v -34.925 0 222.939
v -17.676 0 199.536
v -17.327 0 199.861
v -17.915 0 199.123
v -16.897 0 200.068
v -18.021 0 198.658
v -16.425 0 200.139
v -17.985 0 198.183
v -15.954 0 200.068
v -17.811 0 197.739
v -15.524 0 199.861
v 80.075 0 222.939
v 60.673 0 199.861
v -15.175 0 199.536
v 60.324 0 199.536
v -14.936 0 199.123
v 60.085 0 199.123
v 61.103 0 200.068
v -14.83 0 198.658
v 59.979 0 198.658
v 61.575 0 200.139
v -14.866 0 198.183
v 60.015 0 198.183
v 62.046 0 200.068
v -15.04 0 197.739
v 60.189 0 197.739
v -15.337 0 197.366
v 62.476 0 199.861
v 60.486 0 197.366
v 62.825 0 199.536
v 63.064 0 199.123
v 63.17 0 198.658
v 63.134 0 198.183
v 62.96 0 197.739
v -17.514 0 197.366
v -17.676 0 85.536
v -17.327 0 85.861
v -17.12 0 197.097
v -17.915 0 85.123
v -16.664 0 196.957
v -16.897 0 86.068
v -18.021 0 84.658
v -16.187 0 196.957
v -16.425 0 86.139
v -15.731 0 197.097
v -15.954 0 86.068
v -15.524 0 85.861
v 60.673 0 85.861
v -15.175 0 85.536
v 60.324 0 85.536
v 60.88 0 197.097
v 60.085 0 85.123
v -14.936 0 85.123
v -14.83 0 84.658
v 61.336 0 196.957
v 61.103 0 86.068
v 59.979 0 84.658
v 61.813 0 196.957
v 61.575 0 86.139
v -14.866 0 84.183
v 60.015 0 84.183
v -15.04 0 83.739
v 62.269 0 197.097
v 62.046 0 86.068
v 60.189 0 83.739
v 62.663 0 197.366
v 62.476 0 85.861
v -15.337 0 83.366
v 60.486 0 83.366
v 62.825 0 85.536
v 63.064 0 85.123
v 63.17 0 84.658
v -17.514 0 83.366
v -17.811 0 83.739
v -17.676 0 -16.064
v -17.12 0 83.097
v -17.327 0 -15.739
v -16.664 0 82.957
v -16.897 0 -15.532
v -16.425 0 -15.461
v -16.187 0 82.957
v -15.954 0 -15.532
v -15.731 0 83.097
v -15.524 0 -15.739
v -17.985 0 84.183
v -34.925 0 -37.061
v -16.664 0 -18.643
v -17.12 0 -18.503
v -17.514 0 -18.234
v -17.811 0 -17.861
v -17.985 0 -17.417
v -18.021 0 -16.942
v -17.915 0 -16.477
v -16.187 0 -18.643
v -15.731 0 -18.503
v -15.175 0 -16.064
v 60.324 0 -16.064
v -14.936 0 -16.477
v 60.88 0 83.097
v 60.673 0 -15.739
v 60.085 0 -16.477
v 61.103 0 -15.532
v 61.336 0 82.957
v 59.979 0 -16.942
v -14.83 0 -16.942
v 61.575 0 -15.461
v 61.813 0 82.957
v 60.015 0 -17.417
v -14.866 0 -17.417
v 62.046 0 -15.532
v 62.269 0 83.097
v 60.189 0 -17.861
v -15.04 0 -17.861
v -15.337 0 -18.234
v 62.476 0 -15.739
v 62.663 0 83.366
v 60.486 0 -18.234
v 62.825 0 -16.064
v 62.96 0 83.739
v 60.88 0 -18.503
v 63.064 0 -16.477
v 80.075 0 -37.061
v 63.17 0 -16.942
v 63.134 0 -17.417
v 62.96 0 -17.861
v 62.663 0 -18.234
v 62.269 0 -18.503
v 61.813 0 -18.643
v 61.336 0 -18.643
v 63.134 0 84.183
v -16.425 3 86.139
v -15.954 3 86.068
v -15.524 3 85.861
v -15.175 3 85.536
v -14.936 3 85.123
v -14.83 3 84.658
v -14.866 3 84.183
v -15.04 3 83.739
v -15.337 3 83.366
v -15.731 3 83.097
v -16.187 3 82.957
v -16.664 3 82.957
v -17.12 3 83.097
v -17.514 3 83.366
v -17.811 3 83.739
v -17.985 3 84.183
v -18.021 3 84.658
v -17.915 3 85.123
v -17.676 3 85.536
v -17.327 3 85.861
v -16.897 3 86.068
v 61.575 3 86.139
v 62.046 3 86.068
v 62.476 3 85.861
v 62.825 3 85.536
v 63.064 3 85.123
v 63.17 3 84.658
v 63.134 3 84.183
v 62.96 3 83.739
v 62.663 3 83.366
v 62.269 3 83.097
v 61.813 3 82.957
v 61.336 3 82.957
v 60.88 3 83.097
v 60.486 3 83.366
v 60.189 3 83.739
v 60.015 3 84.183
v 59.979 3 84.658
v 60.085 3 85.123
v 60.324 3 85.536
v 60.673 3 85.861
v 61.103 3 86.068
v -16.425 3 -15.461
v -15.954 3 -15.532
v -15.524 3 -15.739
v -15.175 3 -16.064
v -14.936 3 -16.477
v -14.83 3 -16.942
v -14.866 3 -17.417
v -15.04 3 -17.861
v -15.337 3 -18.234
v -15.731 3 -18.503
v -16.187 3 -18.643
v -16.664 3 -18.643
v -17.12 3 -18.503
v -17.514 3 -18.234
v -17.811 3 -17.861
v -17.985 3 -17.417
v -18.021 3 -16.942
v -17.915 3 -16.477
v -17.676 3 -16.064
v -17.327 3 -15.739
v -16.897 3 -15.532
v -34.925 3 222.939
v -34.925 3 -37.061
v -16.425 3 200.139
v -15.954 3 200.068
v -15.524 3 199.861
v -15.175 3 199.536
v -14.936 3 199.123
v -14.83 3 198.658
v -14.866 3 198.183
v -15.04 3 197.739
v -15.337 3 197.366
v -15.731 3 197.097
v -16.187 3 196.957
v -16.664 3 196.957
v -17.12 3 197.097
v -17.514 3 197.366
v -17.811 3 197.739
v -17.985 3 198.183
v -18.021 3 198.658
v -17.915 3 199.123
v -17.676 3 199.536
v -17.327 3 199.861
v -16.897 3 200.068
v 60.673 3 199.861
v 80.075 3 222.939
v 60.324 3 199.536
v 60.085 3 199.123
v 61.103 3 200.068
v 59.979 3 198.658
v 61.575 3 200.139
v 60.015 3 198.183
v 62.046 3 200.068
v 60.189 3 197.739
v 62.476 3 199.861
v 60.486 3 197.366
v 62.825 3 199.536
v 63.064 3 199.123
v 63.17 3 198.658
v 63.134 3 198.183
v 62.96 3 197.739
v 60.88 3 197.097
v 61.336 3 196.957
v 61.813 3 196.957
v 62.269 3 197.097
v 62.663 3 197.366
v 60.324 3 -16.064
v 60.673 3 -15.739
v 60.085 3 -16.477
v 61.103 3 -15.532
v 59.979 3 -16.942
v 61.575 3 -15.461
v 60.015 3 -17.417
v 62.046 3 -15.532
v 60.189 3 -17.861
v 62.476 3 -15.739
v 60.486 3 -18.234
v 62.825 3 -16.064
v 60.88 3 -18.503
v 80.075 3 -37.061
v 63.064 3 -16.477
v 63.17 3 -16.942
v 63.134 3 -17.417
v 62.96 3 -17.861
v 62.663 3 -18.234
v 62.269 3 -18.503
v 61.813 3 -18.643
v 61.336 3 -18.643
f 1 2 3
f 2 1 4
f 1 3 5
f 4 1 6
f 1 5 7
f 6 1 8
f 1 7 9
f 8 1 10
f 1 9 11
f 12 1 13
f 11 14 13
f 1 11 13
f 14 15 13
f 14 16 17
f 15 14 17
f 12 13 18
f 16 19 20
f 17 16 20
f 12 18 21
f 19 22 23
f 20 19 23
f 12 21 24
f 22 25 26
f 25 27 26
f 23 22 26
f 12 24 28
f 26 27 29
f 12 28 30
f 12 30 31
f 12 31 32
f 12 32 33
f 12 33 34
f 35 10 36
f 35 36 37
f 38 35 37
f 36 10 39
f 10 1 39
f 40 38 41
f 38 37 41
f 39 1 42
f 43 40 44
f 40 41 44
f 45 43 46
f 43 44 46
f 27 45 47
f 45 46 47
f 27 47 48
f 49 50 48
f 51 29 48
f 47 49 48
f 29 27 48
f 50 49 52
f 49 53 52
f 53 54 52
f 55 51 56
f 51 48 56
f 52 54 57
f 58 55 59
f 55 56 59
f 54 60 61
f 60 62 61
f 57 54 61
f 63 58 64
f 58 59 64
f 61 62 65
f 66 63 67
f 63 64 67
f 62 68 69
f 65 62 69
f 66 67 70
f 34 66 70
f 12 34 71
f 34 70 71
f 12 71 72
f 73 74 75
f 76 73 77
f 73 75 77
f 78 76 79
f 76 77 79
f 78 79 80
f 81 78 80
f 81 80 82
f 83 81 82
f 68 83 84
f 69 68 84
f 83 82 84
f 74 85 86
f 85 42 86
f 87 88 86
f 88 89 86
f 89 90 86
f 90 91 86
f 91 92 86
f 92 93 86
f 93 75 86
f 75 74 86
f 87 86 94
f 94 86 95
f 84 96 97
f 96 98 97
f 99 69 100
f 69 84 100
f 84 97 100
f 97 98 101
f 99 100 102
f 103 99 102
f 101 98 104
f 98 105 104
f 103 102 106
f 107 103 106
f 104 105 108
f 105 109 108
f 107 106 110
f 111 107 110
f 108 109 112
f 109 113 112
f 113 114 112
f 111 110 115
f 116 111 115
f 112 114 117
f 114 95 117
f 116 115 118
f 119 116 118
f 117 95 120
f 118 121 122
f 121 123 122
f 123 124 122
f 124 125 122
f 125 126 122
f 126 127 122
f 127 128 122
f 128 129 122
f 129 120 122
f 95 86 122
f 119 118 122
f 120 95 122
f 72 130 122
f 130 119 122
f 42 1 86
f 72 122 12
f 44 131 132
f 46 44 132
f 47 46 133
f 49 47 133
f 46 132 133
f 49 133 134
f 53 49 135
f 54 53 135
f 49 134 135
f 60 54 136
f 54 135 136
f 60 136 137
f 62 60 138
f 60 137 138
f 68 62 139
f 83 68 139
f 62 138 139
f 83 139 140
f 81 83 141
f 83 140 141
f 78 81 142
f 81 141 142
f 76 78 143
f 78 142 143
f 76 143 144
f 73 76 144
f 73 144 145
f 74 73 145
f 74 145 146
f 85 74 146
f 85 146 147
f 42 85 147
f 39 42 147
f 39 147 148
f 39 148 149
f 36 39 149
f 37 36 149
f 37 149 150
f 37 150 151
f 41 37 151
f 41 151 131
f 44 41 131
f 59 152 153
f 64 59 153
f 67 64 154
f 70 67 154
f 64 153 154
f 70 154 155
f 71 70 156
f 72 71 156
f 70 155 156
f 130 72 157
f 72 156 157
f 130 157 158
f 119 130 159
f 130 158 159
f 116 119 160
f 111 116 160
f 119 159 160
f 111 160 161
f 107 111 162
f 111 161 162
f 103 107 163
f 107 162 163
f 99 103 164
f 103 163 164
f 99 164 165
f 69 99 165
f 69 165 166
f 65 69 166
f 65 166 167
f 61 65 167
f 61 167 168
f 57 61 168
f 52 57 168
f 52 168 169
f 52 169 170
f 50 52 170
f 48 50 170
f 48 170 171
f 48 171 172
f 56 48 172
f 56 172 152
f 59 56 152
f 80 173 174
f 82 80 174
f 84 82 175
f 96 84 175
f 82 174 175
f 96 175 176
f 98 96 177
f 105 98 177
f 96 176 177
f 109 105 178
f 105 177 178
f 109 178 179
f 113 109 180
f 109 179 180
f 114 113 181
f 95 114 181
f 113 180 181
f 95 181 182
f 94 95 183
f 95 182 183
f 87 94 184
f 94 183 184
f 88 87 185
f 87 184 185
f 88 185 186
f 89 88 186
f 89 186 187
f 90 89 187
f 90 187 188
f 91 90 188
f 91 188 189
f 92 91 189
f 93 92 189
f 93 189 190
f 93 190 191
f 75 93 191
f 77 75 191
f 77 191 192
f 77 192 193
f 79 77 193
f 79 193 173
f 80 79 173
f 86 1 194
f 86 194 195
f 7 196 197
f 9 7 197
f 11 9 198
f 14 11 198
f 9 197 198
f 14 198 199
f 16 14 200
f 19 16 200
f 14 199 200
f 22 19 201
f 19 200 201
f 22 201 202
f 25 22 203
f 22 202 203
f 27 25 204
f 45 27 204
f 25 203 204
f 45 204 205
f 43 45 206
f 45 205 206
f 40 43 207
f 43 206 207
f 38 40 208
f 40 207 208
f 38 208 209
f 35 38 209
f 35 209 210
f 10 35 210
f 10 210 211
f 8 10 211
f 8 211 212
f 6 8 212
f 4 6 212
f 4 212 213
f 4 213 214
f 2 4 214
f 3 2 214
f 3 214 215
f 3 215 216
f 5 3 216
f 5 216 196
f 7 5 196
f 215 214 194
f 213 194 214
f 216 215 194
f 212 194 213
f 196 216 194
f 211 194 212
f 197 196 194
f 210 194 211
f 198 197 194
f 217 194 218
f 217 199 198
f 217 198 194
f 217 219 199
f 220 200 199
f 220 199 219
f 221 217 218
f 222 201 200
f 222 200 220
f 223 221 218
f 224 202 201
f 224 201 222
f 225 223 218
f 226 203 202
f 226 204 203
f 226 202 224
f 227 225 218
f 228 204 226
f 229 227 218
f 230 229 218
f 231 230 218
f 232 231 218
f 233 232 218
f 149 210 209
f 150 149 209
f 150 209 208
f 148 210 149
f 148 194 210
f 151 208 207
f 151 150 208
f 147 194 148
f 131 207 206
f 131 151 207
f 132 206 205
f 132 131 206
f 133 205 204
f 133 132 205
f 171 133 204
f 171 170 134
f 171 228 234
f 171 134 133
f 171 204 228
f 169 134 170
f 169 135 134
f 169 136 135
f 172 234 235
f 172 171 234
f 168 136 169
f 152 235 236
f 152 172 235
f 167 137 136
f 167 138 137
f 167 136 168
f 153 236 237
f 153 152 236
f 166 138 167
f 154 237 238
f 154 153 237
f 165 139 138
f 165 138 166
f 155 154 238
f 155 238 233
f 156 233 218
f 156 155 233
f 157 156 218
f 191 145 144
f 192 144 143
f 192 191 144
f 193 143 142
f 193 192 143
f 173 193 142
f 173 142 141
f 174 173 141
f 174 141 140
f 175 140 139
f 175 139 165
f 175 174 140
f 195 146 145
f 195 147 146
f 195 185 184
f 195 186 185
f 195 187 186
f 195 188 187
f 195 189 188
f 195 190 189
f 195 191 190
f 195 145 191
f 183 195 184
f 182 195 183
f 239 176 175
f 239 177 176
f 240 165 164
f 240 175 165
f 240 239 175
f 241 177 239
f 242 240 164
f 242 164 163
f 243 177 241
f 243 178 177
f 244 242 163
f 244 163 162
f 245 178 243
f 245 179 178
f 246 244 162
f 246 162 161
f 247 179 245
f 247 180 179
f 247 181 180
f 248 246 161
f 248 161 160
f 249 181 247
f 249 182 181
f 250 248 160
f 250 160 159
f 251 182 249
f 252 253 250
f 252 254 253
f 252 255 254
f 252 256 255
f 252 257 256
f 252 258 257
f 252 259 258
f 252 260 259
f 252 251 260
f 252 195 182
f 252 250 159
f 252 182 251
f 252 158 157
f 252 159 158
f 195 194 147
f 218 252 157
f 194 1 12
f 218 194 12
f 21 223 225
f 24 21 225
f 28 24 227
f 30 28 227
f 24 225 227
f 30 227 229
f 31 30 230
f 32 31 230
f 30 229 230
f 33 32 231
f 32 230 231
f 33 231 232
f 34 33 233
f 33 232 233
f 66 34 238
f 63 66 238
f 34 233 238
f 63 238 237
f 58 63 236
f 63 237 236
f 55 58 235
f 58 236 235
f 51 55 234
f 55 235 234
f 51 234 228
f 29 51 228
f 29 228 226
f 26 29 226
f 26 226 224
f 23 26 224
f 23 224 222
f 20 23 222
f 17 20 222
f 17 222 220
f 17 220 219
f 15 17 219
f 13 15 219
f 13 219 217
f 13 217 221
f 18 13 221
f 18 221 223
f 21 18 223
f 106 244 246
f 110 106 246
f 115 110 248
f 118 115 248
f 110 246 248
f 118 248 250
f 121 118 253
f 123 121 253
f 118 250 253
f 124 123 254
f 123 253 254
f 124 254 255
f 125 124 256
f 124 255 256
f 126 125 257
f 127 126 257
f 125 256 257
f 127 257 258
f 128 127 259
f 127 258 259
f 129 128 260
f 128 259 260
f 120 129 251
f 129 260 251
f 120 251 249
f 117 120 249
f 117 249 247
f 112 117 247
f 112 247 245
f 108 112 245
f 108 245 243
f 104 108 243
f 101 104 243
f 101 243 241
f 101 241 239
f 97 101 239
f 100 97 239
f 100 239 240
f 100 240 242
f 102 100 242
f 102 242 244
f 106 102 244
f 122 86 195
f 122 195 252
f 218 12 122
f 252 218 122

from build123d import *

# Parameters (mm, degrees)
ESQUISSE1_W             = 115
ESQUISSE1_H             = 260
BOSS_EXTRU_1_DEPTH      = 3
ENL_V_MAT_EXTRU_1_REACH = 238.902
ESQUISSE2_R             = 1.6


with BuildPart() as part:
    # Esquisse1 → Boss.-Extru.1 (new body)
    with BuildSketch(Plane(origin=(0, 0, 0), x_dir=(1, 0, 0), z_dir=(0, 1, 0))):
        with Locations((22.5745208, -92.938790058)):
            Rectangle(ESQUISSE1_W, ESQUISSE1_H)
    extrude(amount=BOSS_EXTRU_1_DEPTH)

    # Esquisse2 → Enlèv. mat.-Extru.1 (cut, up to next)
    with BuildSketch(Plane(origin=(0, 3, 0), x_dir=(1, 0, 0), z_dir=(0, 1, 0)), mode=Mode.PRIVATE) as enl_v_mat_extru_1_sk1:
        with Locations(Location((-16.4254792, -198.538790058, 0), (0, 0, 270))):
            Circle(ESQUISSE2_R)
    enl_v_mat_extru_1_tool1 = extrude(enl_v_mat_extru_1_sk1.sketch, amount=-ENL_V_MAT_EXTRU_1_REACH, mode=Mode.PRIVATE) & part.part
    # Esquisse2 → Enlèv. mat.-Extru.1 (cut, up to next)
    with BuildSketch(Plane(origin=(0, 3, 0), x_dir=(1, 0, 0), z_dir=(0, 1, 0)), mode=Mode.PRIVATE) as enl_v_mat_extru_1_sk2:
        with Locations(Location((61.5745208, -198.538790058, 0), (0, 0, 270))):
            Circle(ESQUISSE2_R)
    enl_v_mat_extru_1_tool2 = extrude(enl_v_mat_extru_1_sk2.sketch, amount=-ENL_V_MAT_EXTRU_1_REACH, mode=Mode.PRIVATE) & part.part
    # Esquisse2 → Enlèv. mat.-Extru.1 (cut, up to next)
    with BuildSketch(Plane(origin=(0, 3, 0), x_dir=(1, 0, 0), z_dir=(0, 1, 0)), mode=Mode.PRIVATE) as enl_v_mat_extru_1_sk3:
        with Locations(Location((-16.4254792, -84.538790058, 0), (0, 0, 270))):
            Circle(ESQUISSE2_R)
    enl_v_mat_extru_1_tool3 = extrude(enl_v_mat_extru_1_sk3.sketch, amount=-ENL_V_MAT_EXTRU_1_REACH, mode=Mode.PRIVATE) & part.part
    # Esquisse2 → Enlèv. mat.-Extru.1 (cut, up to next)
    with BuildSketch(Plane(origin=(0, 3, 0), x_dir=(1, 0, 0), z_dir=(0, 1, 0)), mode=Mode.PRIVATE) as enl_v_mat_extru_1_sk4:
        with Locations(Location((61.5745208, -84.538790058, 0), (0, 0, 270))):
            Circle(ESQUISSE2_R)
    enl_v_mat_extru_1_tool4 = extrude(enl_v_mat_extru_1_sk4.sketch, amount=-ENL_V_MAT_EXTRU_1_REACH, mode=Mode.PRIVATE) & part.part
    # Esquisse2 → Enlèv. mat.-Extru.1 (cut, up to next)
    with BuildSketch(Plane(origin=(0, 3, 0), x_dir=(1, 0, 0), z_dir=(0, 1, 0)), mode=Mode.PRIVATE) as enl_v_mat_extru_1_sk5:
        with Locations(Location((-16.4254792, 17.061209942, 0), (0, 0, 270))):
            Circle(ESQUISSE2_R)
    enl_v_mat_extru_1_tool5 = extrude(enl_v_mat_extru_1_sk5.sketch, amount=-ENL_V_MAT_EXTRU_1_REACH, mode=Mode.PRIVATE) & part.part
    # Esquisse2 → Enlèv. mat.-Extru.1 (cut, up to next)
    with BuildSketch(Plane(origin=(0, 3, 0), x_dir=(1, 0, 0), z_dir=(0, 1, 0)), mode=Mode.PRIVATE) as enl_v_mat_extru_1_sk6:
        with Locations(Location((61.5745208, 17.061209942, 0), (0, 0, 270))):
            Circle(ESQUISSE2_R)
    enl_v_mat_extru_1_tool6 = extrude(enl_v_mat_extru_1_sk6.sketch, amount=-ENL_V_MAT_EXTRU_1_REACH, mode=Mode.PRIVATE) & part.part
    add(enl_v_mat_extru_1_tool1.solids().sort_by_distance((-16.425479, 3, 198.53879))[0], mode=Mode.SUBTRACT)
    add(enl_v_mat_extru_1_tool2.solids().sort_by_distance((61.574521, 3, 198.53879))[0], mode=Mode.SUBTRACT)
    add(enl_v_mat_extru_1_tool3.solids().sort_by_distance((-16.425479, 3, 84.53879))[0], mode=Mode.SUBTRACT)
    add(enl_v_mat_extru_1_tool4.solids().sort_by_distance((61.574521, 3, 84.53879))[0], mode=Mode.SUBTRACT)
    add(enl_v_mat_extru_1_tool5.solids().sort_by_distance((-16.425479, 3, -17.06121))[0], mode=Mode.SUBTRACT)
    add(enl_v_mat_extru_1_tool6.solids().sort_by_distance((61.574521, 3, -17.06121))[0], mode=Mode.SUBTRACT)


solid = part.part
